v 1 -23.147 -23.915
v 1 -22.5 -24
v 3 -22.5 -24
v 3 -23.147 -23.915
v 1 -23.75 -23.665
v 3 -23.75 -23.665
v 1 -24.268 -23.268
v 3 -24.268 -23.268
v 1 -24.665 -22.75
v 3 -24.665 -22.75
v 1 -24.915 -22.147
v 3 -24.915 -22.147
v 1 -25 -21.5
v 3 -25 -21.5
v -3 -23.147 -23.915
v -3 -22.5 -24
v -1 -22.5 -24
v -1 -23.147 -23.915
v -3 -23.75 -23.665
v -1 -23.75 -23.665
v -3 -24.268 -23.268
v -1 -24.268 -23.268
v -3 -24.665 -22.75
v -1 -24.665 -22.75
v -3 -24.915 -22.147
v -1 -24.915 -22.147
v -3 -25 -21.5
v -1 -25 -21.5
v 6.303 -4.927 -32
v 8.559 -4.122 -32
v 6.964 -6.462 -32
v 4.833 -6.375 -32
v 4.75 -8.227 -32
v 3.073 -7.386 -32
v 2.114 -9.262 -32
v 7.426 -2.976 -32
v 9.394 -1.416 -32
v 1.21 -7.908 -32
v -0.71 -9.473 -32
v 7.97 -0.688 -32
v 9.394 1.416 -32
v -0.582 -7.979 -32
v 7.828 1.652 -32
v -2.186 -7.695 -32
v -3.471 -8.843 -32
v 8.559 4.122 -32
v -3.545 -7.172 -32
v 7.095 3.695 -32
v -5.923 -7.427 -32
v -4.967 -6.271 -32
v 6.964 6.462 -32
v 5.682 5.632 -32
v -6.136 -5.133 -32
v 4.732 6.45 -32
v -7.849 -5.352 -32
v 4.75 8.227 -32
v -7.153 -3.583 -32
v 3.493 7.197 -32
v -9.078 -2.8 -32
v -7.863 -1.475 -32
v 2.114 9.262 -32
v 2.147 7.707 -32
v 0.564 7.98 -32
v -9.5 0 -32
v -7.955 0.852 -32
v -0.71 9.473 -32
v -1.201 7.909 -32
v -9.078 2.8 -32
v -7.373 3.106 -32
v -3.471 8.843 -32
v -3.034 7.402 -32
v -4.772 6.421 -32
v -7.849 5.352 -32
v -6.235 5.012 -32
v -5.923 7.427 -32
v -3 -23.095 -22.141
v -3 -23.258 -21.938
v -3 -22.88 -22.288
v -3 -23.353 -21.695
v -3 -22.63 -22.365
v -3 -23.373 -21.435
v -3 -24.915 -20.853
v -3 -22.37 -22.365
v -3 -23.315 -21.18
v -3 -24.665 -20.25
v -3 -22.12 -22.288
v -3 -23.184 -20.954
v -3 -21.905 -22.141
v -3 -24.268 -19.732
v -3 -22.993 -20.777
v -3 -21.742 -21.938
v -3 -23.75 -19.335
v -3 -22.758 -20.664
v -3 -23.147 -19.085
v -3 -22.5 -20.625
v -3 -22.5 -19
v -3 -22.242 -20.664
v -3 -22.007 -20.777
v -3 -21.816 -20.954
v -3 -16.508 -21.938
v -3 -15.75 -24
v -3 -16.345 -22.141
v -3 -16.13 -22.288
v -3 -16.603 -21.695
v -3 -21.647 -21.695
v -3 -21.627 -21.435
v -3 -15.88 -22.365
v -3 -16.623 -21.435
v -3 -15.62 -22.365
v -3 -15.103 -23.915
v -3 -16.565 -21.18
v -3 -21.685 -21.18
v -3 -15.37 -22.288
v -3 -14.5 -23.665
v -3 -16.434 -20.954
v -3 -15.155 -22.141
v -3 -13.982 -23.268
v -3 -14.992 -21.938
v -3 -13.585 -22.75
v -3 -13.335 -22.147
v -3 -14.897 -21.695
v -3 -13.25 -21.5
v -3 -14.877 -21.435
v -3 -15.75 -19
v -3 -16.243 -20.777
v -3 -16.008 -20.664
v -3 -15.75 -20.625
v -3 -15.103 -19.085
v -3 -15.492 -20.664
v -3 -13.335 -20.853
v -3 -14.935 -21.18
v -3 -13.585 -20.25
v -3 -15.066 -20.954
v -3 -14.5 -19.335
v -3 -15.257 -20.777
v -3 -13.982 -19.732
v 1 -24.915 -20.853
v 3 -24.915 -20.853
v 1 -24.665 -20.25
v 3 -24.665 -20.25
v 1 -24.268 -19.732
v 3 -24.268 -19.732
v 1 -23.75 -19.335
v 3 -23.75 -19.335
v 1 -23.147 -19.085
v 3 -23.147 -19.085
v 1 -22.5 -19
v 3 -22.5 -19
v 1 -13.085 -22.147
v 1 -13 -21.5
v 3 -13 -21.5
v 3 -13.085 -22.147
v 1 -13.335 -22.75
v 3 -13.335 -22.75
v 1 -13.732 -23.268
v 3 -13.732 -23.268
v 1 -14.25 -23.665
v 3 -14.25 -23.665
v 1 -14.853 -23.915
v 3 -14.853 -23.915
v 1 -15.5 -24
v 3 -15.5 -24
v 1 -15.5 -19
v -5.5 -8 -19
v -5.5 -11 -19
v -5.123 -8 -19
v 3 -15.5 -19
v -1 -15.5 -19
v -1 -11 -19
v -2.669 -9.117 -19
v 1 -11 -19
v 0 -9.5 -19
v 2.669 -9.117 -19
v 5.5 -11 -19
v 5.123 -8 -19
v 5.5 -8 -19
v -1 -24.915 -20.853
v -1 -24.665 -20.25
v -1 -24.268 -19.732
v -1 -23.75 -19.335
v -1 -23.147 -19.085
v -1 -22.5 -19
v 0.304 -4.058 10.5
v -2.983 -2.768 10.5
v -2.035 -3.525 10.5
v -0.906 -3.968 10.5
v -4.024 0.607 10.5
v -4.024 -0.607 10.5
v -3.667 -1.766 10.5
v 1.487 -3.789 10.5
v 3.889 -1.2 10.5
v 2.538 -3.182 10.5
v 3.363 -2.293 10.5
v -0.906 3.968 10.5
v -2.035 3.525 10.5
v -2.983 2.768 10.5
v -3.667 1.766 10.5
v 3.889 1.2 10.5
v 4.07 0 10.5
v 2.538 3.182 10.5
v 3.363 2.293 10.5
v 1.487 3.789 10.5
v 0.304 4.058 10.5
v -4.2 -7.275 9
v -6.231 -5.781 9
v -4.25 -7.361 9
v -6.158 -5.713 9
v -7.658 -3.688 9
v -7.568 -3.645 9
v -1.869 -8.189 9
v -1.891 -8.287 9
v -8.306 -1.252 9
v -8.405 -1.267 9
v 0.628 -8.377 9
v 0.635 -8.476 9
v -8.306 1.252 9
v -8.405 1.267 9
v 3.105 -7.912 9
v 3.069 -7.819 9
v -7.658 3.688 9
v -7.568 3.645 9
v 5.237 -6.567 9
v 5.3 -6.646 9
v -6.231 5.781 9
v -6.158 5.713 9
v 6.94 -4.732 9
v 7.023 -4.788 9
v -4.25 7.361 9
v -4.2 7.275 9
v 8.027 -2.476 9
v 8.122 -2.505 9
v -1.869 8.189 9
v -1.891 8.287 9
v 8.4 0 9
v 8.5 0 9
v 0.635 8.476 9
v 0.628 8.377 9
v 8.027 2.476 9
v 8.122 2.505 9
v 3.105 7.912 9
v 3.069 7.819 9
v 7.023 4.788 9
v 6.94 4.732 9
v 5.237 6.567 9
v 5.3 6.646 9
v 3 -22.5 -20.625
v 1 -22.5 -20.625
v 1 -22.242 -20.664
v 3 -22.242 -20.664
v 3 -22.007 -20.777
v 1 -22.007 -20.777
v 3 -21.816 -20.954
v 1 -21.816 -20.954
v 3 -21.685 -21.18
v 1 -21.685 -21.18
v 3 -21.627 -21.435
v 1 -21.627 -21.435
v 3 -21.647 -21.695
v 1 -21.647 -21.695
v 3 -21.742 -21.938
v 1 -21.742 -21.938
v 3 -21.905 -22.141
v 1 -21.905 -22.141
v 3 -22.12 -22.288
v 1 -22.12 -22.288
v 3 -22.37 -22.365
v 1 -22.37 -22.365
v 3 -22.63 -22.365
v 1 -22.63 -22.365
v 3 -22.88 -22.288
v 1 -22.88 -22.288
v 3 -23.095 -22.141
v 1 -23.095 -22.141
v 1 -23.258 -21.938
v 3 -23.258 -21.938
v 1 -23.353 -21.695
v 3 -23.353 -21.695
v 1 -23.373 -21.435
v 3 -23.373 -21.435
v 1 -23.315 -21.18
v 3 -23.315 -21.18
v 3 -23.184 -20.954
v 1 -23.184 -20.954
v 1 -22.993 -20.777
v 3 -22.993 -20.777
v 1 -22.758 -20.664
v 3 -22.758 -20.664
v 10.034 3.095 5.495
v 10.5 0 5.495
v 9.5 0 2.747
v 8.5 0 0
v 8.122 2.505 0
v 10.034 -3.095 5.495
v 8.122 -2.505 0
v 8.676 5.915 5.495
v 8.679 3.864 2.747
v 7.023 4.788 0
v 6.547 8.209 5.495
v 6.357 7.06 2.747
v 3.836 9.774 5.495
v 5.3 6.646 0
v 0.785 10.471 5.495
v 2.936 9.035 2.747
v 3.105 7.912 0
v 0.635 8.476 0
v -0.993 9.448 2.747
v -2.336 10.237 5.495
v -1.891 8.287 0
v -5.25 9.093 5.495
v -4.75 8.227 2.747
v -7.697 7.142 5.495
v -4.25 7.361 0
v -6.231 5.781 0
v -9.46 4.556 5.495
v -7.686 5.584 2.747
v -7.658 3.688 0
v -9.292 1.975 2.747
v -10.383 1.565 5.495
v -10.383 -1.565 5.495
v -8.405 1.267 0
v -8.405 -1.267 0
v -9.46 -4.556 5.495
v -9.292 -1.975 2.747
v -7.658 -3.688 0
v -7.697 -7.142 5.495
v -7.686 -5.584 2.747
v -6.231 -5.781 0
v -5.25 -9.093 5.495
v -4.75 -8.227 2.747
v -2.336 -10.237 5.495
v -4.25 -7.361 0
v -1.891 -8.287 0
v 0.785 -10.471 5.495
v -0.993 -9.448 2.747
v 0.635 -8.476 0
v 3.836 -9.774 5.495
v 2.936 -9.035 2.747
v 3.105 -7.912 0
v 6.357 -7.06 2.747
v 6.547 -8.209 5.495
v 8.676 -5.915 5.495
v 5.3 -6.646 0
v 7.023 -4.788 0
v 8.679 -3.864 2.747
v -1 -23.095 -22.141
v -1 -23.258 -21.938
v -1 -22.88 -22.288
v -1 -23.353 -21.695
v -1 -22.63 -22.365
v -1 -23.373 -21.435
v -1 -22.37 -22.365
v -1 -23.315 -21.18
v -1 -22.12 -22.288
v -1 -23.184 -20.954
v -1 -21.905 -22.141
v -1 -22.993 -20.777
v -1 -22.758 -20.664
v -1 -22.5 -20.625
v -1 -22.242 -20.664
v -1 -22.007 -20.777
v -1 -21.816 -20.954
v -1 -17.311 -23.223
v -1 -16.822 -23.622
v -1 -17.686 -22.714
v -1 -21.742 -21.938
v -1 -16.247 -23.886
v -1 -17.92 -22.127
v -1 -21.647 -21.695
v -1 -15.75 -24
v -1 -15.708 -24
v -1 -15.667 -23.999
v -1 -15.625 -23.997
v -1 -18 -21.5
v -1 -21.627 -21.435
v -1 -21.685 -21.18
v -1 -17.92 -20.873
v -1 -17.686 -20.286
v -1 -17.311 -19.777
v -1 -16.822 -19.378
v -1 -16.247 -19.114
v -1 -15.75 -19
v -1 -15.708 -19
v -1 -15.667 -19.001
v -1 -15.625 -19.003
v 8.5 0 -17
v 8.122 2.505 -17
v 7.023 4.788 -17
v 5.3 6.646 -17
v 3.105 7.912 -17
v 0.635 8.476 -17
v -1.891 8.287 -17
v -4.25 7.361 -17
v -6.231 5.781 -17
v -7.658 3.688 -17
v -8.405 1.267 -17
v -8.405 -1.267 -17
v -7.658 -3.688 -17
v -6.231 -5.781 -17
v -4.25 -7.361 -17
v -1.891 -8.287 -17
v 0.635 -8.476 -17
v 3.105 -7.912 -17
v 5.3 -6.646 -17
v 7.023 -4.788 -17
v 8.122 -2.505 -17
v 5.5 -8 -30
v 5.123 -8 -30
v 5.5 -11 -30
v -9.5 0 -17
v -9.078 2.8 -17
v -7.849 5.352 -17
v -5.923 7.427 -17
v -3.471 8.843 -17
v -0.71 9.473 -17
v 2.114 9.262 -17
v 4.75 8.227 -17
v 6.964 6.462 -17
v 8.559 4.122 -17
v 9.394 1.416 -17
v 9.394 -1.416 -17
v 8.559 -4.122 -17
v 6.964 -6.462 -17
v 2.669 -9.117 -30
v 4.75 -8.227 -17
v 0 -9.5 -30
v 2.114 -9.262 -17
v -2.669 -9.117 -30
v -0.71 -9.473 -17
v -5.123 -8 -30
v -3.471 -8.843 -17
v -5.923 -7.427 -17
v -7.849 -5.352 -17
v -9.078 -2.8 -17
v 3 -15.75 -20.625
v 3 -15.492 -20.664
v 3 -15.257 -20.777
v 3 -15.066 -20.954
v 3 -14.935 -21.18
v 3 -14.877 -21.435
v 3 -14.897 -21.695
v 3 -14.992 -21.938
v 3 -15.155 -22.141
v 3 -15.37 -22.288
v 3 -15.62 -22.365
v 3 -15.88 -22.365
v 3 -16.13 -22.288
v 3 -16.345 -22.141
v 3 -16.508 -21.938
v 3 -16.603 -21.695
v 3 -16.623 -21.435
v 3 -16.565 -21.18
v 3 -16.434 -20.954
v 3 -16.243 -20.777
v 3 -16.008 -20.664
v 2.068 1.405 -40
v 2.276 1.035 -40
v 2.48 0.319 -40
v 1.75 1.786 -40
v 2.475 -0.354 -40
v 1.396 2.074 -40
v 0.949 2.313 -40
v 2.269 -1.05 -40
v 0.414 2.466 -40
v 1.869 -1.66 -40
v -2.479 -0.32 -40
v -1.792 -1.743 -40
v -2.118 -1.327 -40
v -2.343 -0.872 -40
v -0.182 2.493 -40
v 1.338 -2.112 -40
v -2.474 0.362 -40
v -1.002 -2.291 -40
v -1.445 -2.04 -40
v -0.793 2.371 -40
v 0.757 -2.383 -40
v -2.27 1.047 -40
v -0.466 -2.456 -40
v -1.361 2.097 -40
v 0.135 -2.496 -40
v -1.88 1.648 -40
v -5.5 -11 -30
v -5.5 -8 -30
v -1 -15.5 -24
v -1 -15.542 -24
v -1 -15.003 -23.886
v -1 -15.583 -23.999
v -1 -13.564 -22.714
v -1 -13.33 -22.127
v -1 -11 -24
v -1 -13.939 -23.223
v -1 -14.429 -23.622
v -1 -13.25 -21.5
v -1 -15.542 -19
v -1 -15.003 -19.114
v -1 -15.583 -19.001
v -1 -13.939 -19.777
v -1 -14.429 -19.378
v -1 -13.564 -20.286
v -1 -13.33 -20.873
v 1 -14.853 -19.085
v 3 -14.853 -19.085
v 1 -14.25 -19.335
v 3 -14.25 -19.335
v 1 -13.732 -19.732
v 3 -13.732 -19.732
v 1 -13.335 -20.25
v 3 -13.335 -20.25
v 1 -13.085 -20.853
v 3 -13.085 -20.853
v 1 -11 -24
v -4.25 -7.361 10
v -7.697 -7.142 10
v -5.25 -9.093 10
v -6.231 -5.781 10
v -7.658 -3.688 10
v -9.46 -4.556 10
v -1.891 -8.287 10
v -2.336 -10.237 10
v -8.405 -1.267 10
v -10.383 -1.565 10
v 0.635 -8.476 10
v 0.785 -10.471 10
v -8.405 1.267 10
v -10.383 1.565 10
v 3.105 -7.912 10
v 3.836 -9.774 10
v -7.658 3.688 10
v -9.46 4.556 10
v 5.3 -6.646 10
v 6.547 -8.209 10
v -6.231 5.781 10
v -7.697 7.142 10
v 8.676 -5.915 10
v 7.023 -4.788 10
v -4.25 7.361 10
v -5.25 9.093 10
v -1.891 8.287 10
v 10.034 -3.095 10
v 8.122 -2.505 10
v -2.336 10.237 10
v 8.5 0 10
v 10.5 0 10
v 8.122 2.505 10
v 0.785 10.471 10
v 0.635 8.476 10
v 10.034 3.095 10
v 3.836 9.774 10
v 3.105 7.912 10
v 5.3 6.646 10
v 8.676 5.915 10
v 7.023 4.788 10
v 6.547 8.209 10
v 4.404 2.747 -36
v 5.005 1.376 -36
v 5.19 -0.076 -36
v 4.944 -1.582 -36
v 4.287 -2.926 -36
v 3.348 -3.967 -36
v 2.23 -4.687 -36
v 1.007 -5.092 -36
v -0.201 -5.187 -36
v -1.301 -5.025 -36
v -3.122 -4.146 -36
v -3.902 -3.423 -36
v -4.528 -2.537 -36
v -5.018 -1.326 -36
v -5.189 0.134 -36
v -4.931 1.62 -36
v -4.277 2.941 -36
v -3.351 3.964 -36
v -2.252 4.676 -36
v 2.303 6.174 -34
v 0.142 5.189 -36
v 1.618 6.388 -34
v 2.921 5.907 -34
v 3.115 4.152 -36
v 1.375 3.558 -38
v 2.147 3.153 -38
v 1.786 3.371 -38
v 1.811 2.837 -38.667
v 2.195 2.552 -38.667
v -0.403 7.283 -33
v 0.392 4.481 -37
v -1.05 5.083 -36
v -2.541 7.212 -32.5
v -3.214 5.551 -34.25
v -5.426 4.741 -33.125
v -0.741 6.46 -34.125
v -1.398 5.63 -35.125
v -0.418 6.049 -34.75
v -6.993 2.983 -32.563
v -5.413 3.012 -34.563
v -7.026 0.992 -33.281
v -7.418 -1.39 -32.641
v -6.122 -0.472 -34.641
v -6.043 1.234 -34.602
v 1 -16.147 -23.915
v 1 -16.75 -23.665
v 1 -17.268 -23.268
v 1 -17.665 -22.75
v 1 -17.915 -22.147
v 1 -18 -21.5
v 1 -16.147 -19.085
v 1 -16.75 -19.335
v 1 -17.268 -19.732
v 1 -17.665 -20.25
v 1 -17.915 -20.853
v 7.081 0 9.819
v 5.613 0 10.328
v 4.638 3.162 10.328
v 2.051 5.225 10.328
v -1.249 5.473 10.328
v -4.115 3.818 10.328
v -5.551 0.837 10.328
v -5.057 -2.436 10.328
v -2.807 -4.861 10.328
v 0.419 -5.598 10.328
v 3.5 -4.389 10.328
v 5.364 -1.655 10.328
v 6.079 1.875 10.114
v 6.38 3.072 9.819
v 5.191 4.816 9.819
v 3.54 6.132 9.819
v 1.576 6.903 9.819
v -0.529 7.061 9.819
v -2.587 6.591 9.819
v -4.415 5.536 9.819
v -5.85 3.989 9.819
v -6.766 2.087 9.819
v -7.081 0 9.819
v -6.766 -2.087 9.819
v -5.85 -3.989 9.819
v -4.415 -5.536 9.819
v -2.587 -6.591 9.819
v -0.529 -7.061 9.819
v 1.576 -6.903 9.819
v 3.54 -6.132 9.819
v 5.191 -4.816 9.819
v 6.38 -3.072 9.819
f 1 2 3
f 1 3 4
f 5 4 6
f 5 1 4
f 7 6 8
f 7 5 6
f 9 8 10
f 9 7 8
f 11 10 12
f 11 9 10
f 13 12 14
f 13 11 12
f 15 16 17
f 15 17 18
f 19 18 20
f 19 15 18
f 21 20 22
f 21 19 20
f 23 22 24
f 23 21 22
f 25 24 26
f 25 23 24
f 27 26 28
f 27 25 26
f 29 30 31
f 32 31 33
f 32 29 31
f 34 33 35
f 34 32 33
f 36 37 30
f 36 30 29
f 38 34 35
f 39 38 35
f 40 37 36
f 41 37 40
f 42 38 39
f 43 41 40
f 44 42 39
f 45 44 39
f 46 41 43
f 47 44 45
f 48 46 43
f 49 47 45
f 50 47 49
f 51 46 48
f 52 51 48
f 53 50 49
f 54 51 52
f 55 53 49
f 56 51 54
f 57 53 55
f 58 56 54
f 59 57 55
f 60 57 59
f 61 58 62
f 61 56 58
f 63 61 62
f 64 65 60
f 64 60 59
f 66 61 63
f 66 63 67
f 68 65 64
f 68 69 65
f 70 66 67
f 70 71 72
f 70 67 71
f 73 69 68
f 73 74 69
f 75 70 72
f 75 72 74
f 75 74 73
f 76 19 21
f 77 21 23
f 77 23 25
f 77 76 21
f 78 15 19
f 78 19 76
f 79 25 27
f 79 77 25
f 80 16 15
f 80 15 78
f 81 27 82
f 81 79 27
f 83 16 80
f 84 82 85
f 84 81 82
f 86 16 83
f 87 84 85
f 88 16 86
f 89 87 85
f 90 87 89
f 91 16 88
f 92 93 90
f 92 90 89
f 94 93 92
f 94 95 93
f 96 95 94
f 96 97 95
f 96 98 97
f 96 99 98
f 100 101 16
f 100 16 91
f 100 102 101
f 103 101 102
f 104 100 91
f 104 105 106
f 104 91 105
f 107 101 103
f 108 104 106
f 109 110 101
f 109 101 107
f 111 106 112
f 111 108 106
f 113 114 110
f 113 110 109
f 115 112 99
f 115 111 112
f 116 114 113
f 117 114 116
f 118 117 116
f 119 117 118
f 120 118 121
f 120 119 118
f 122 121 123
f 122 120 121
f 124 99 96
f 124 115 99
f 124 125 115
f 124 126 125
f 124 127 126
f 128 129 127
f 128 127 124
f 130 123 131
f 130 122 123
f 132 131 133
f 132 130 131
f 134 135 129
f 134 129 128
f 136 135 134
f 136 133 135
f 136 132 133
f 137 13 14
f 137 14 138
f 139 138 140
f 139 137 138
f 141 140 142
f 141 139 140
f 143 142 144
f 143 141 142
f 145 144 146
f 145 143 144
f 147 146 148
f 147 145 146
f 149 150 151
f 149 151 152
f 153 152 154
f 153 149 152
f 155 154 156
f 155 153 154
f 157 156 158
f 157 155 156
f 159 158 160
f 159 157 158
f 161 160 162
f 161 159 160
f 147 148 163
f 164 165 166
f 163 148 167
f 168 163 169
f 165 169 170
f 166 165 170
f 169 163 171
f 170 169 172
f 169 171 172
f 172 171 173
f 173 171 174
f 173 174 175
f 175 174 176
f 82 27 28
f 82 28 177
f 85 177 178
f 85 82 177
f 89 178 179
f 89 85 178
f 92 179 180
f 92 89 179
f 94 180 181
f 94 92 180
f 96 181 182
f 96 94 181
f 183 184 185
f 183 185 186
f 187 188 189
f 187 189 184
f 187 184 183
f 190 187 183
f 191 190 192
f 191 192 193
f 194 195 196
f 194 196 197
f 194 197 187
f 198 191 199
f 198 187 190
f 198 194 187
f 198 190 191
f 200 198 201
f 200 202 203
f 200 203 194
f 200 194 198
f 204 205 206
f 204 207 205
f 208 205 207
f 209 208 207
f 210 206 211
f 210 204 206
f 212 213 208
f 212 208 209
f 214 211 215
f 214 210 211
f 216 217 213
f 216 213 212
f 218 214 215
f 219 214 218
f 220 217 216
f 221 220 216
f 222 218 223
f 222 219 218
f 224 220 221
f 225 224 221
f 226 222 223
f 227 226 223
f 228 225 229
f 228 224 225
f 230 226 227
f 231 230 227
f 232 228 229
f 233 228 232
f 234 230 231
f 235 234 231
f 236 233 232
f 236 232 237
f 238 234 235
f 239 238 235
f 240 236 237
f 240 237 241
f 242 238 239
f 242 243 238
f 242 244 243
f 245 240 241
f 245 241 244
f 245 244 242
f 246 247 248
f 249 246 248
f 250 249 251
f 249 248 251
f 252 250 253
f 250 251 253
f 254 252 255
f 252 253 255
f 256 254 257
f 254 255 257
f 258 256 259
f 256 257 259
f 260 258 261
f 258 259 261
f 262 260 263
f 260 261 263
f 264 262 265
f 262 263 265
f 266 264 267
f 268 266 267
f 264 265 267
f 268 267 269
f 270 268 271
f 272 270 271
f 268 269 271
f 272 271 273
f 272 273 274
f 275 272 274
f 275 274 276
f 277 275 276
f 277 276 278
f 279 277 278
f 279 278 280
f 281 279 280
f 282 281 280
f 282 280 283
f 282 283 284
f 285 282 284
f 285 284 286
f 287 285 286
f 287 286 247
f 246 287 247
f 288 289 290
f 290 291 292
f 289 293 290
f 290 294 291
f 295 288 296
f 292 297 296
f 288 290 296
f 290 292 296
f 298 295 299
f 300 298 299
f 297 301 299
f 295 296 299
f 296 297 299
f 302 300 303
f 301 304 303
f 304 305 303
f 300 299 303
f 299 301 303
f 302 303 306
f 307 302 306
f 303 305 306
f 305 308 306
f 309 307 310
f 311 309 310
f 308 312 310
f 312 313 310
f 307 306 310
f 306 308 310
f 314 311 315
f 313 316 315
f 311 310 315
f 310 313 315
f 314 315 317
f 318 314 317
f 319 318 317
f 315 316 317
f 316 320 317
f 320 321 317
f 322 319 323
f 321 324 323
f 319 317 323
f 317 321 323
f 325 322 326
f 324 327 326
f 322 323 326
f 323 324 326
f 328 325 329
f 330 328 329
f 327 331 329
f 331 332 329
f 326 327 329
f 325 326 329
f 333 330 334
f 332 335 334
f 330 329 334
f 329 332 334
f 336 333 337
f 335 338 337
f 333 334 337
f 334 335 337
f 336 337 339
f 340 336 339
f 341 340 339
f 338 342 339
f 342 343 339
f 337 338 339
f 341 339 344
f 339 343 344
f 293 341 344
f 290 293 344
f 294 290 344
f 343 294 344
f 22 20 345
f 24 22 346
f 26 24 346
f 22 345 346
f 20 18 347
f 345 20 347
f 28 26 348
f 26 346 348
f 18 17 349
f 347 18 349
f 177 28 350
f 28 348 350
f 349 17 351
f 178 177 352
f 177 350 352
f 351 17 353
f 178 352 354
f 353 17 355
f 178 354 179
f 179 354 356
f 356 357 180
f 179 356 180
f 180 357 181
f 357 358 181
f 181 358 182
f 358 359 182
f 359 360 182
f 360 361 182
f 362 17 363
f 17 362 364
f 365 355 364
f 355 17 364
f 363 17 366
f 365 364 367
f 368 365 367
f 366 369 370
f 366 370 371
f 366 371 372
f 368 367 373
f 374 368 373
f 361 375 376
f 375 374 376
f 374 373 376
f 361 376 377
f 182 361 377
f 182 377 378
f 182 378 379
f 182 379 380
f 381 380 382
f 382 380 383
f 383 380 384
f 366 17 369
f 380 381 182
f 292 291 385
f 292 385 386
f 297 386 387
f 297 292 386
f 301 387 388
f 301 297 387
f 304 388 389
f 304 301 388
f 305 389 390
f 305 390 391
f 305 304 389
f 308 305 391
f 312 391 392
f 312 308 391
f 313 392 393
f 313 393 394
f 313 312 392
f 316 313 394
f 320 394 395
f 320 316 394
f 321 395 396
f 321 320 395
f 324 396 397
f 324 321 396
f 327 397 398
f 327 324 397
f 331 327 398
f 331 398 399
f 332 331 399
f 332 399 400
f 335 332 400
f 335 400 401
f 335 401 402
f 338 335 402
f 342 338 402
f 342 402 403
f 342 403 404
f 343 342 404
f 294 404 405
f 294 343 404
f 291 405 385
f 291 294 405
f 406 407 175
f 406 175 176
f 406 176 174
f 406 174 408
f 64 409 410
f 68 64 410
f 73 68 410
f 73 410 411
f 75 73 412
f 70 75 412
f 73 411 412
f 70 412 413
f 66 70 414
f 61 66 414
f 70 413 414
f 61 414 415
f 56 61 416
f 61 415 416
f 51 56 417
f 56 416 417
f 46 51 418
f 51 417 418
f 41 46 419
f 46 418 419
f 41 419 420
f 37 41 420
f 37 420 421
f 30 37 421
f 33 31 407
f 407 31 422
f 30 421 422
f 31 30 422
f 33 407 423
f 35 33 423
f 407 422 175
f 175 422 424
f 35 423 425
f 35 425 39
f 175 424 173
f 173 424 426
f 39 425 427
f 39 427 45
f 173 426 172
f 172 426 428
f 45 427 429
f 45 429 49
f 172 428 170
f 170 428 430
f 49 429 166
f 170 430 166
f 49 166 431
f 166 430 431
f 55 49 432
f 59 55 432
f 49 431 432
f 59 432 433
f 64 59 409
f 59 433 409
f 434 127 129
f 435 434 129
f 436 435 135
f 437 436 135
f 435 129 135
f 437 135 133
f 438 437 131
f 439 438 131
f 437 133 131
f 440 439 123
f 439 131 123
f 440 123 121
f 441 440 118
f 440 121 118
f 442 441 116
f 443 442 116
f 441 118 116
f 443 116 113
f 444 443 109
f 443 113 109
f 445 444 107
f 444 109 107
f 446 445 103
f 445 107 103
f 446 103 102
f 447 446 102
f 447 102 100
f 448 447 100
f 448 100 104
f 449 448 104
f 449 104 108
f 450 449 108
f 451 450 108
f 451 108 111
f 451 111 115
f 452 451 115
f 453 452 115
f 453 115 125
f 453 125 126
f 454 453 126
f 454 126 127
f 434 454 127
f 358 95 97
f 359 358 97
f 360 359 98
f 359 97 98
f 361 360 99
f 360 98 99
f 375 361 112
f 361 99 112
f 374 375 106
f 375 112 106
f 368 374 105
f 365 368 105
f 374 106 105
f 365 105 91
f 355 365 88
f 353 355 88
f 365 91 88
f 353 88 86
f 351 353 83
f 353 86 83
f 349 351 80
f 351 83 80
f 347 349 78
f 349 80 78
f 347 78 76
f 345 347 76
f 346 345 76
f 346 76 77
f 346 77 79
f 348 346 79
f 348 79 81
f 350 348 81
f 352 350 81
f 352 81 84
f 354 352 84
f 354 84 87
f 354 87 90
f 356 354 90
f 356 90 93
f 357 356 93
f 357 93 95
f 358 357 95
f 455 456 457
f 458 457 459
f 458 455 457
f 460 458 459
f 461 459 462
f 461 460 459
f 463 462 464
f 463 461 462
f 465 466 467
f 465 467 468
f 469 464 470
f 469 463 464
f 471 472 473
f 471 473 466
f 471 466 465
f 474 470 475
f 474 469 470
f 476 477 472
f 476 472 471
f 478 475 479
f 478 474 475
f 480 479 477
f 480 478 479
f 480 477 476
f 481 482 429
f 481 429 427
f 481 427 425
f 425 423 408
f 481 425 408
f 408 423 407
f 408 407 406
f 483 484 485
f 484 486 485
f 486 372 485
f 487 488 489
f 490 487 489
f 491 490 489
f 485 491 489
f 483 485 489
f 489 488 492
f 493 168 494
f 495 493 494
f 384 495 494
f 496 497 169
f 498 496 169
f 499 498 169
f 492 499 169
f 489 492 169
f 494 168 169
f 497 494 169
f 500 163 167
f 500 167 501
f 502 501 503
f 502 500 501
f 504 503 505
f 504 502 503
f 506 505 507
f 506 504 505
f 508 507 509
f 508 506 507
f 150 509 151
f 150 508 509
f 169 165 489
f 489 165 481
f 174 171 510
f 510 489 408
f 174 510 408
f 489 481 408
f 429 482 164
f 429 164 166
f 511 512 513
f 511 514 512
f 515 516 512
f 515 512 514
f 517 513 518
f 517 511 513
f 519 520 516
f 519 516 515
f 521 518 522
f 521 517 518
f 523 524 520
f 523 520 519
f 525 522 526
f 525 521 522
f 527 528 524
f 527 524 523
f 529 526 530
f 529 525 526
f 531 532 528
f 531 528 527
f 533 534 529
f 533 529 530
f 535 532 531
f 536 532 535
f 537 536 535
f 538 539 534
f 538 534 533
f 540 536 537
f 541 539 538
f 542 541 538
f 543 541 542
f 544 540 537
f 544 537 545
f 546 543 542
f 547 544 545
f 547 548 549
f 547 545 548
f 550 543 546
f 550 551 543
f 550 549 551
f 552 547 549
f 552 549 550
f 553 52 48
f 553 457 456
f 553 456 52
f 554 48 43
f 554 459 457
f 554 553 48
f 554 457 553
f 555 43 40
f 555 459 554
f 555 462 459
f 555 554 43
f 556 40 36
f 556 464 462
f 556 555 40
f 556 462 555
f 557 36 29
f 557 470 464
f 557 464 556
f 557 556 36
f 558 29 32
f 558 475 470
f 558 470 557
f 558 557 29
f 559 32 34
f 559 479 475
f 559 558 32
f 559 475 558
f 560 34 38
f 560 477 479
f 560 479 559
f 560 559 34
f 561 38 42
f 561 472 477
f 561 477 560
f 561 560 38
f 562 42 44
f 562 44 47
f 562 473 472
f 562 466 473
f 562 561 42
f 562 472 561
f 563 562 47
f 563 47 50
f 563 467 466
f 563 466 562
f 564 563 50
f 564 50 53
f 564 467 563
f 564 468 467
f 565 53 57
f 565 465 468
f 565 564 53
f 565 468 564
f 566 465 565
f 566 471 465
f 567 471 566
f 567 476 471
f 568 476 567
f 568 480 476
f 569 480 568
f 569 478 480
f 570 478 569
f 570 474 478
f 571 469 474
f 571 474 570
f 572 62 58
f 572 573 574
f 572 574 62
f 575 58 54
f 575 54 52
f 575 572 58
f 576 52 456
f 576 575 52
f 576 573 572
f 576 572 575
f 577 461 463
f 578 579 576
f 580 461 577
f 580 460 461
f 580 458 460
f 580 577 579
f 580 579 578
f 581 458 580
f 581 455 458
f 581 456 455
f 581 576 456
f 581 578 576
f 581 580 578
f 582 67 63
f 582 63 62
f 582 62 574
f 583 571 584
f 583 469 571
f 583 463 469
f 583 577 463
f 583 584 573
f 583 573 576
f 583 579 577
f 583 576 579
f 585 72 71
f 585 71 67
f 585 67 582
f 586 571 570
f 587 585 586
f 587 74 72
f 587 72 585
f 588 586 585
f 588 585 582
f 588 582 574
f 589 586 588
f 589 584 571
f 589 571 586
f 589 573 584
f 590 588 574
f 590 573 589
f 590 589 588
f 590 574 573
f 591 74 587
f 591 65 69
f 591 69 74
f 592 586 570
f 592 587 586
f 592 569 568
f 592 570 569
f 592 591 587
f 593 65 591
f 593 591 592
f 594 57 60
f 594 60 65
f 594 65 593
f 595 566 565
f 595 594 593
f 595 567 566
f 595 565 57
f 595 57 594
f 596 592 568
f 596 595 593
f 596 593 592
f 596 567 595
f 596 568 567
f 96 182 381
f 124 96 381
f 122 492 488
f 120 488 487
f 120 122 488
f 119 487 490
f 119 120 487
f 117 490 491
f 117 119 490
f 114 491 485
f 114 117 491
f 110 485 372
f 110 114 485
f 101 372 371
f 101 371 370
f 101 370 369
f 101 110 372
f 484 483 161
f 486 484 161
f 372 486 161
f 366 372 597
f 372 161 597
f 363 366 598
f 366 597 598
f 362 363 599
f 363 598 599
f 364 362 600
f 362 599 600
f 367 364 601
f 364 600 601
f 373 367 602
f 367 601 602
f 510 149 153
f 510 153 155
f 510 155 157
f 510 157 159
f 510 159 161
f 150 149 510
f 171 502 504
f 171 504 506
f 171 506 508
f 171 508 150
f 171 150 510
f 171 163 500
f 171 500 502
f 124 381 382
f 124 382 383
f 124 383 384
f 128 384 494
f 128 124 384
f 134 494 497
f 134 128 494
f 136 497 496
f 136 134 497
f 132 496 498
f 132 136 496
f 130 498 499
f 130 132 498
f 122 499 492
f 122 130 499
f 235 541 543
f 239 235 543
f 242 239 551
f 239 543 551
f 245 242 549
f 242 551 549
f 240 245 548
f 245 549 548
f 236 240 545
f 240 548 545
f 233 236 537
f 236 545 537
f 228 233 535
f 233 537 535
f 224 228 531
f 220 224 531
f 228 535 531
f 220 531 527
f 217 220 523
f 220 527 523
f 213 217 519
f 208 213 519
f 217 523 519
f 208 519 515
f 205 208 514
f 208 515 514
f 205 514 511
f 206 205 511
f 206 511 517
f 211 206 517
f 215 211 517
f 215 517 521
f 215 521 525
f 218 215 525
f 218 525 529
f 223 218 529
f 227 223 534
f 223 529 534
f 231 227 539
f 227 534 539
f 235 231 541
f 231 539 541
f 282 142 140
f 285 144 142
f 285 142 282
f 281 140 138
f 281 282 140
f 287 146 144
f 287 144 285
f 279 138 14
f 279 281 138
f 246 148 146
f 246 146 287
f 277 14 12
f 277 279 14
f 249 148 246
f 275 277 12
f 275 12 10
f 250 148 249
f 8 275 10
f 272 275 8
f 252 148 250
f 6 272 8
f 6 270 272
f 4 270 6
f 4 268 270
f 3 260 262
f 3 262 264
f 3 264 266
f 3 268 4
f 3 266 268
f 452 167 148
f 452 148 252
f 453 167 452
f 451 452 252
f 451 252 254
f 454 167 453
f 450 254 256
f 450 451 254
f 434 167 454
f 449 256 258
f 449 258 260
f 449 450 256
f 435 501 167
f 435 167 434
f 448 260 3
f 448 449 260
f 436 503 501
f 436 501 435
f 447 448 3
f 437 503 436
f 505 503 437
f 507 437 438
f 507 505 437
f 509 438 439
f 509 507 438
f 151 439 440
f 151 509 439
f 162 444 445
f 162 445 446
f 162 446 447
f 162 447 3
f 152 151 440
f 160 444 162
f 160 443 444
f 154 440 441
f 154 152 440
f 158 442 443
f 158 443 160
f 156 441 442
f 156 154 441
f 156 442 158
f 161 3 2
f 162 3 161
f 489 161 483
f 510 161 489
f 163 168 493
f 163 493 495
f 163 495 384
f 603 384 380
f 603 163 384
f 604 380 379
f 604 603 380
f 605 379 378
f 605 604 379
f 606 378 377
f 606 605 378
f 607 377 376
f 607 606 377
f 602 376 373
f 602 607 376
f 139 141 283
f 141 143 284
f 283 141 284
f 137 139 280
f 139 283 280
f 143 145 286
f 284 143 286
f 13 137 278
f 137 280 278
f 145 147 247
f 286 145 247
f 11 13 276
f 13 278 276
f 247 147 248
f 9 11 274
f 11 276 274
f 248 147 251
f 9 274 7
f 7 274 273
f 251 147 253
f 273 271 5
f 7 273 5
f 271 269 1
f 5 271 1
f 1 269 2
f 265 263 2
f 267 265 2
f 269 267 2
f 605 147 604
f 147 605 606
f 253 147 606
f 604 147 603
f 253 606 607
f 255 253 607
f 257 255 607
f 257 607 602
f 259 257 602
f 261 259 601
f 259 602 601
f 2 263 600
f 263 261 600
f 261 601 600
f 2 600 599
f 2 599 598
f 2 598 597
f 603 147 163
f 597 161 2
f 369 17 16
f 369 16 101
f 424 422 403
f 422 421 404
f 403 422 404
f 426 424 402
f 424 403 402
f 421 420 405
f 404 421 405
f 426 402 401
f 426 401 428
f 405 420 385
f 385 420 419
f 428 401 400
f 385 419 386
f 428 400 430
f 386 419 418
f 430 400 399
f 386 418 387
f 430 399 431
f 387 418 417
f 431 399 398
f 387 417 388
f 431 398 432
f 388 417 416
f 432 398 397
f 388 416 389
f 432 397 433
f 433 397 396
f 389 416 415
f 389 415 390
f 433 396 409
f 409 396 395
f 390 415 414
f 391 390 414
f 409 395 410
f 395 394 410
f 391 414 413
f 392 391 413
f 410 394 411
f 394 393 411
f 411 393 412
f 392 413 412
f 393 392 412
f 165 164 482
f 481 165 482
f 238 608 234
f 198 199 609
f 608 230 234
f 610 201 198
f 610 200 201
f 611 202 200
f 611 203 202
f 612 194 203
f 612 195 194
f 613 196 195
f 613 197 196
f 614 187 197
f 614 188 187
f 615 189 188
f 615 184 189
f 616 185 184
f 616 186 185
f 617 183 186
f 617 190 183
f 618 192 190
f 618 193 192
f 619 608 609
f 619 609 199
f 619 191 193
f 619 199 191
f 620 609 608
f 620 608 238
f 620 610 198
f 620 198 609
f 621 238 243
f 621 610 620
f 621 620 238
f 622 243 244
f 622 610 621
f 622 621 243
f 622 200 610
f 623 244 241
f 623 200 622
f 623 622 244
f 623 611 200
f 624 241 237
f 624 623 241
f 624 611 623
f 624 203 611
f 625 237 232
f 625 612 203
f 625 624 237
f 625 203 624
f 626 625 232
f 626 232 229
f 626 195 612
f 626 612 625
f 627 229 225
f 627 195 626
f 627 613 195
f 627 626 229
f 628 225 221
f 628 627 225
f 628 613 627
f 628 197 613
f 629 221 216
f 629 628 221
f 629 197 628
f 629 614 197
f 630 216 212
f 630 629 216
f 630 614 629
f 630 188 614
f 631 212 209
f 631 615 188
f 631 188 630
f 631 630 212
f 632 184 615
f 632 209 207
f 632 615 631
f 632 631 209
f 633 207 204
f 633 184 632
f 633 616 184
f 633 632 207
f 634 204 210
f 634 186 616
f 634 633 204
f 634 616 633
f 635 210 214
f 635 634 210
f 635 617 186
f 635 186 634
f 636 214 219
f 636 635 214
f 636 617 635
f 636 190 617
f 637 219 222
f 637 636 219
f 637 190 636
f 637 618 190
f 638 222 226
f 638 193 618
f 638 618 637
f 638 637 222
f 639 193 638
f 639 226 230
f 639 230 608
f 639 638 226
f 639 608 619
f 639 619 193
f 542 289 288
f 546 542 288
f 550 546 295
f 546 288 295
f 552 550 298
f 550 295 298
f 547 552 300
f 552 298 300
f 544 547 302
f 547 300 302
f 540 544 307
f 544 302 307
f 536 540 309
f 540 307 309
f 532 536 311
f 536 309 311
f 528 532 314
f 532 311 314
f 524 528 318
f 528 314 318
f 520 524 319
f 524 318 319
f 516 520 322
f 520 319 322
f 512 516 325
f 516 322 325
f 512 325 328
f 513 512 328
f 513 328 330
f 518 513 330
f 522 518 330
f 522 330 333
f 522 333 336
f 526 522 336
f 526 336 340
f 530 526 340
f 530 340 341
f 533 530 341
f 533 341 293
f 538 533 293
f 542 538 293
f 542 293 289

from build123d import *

# Parameters (mm, degrees)
SKETCH1_R            = 8.5
BOSS_EXTRUDE1_DEPTH  = 17
SKETCH2_R            = 10.5
BOSS_EXTRUDE2_DEPTH  = 10
CHAMFER1_SIZE        = 5.494954839
CHAMFER1_SIZE_2      = 2
SKETCH3_R            = 8.5
CUT_EXTRUDE1_DEPTH   = 1
SKETCH4_R            = 9.5
BOSS_EXTRUDE3_DEPTH  = 15
SKETCH9_W            = 11
SKETCH9_H            = 11
BOSS_EXTRUDE4_DEPTH  = 3
SKETCH10_W           = 2
SKETCH10_H           = 5
BOSS_EXTRUDE5_DEPTH  = 7
FILLET1_R            = 2.5
SKETCH13_R           = 8.4
BOSS_EXTRUDE7_DEPTH  = 1.5
FILLET3_R            = 7
SKETCH14_W           = 5
SKETCH14_H           = 12
BOSS_EXTRUDE9_DEPTH  = 2
SKETCH15_W           = 5
SKETCH15_H           = 11.75
BOSS_EXTRUDE10_DEPTH = 2
FILLET4_START        = -5.5
FILLET4_DEPTH        = 4.5
FILLET4_START_2      = 1
FILLET4_2_DEPTH      = 4.5
CUT_EXTRUDE3_REACH   = 51.064
SKETCH16_R           = 0.875


with BuildPart() as part:
    # Sketch1 → Boss-Extrude1 (new body)
    with BuildSketch(Plane.XY):
        Circle(SKETCH1_R)
    extrude(amount=-BOSS_EXTRUDE1_DEPTH)

    # Sketch2 → Boss-Extrude2 (add)
    with BuildSketch(Plane.XY):
        Circle(SKETCH2_R)
    extrude(amount=BOSS_EXTRUDE2_DEPTH)

    # Chamfer1
    # the kernel refuses this chamfer: 5.494954839, 2 mm, written as the material it takes off along each edge
    with BuildSketch(Plane(origin=(0, 0, 0), x_dir=(1, 0, 0), z_dir=(0, -1, 0))) as chamfer1_piece_1_section:
        Polygon((10.5, CHAMFER1_SIZE), (10.5 - CHAMFER1_SIZE_2, 0), (10.5, 0), align=None)
    chamfer1_piece_1 = revolve(axis=Axis((0, 0, 0), (0, 0, 1)), mode=Mode.PRIVATE)
    chamfer1_piece_1 = chamfer1_piece_1 - Plane(origin=(0, 0, 0), x_dir=(1, 0, 0), z_dir=(0, 0, 1)) * Cylinder(8.5, 42, mode=Mode.PRIVATE)
    add(chamfer1_piece_1, mode=Mode.SUBTRACT)

    # Sketch3 → Cut-Extrude1 (cut)
    with BuildSketch(Plane.XY.offset(10)):
        Circle(SKETCH3_R)
    extrude(amount=-CUT_EXTRUDE1_DEPTH, mode=Mode.SUBTRACT)

    # Sketch4 → Boss-Extrude3 (add)
    with BuildSketch(Plane(origin=(0, 0, -17), x_dir=(-1, 0, 0), z_dir=(0, 0, -1))):
        Circle(SKETCH4_R)
    extrude(amount=BOSS_EXTRUDE3_DEPTH)

    # Loft2: read off the stored shape, not the designer's step
    # Loft2: loft between two sections, ruled curve by curve
    loft2_from = [
        Edge.make_bspline([(5.6816796, 5.631919471, -32), (16.945518542, -5.731439728, -32), (5.582159343, -16.99527867, -32), (-5.6816796, -5.631919471, -32), (-16.945518542, 5.731439728, -32), (-5.582159343, 16.99527867, -32), (5.6816796, 5.631919471, -32)], [0, 0, 0, 0, 0.5, 0.5, 0.5, 1, 1, 1, 1], 3, [1, 0.333333333, 0.333333333, 1, 0.333333333, 0.333333333, 1]),
    ]
    loft2_to = [
        Edge.make_bspline([(2.275915377, 1.034509157, -40), (4.344933691, -3.517321597, -40), (-0.206897063, -5.586339911, -40), (-2.275915377, -1.034509157, -40), (-4.344933691, 3.517321597, -40), (0.206897063, 5.586339911, -40), (2.275915377, 1.034509157, -40)], [0, 0, 0, 0, 0.5, 0.5, 0.5, 1, 1, 1, 1], 3, [1, 0.333333333, 0.333333333, 1, 0.333333333, 0.333333333, 1]),
    ]
    loft2 = Solid(Shell([*[Face.make_surface_from_curves(loft2_from[k], loft2_to[k]) for k in range(1)], Face(Wire(loft2_from)), Face(Wire(loft2_to))]))
    add(loft2)

    # Sketch9 → Boss-Extrude4 (add)
    with BuildSketch(Plane(origin=(0, -8, 0), x_dir=(1, 0, 0), z_dir=(0, 1, 0))):
        with Locations((0, 24.5)):
            Rectangle(SKETCH9_W, SKETCH9_H)
    extrude(amount=-BOSS_EXTRUDE4_DEPTH)

    # Sketch10 → Boss-Extrude5 (add)
    with BuildSketch(Plane.XZ.offset(11)):
        with Locations((0, -21.5)):
            Rectangle(SKETCH10_W, SKETCH10_H)
    extrude(amount=BOSS_EXTRUDE5_DEPTH)

    # Fillet1
    fillet1_edges = [part.edges().sort_by_distance(p)[0] for p in [
        (0, -18, -19),
        (0, -18, -24),
    ]]
    fillet(fillet1_edges, radius=FILLET1_R - 0.0001)  # a hair under: the kernel refuses the full size

    # Sketch13 → Boss-Extrude7 (add)
    with BuildSketch(Plane.XY.offset(9)):
        Circle(SKETCH13_R)
    extrude(amount=BOSS_EXTRUDE7_DEPTH)

    # Fillet3
    # the kernel refuses this fillet: 7 mm, written as the material it takes off along each edge
    with BuildSketch(Plane(origin=(0, 0, 10.5), x_dir=(1, 0, 0), z_dir=(0, -1, 0))) as fillet3_piece_1:
        with BuildLine():
            CenterArc((4.069872981, -7), FILLET3_R, 51.786789298, 38.213210702)
            Line((4.069872981, 0), (8.4, 0))
            Line((8.4, 0), (8.4, -1.5))
        make_face()
    revolve(axis=Axis((0, 0, 10.5), (0, 0, 1)), mode=Mode.SUBTRACT)

    # Sketch14 → Boss-Extrude9 (add)
    with BuildSketch(Plane(origin=(1, 0, 0), x_dir=(0, 0, -1), z_dir=(1, 0, 0))):
        with Locations((21.5, -19)):
            Rectangle(SKETCH14_W, SKETCH14_H)
    extrude(amount=BOSS_EXTRUDE9_DEPTH)

    # Sketch15 → Boss-Extrude10 (add)
    with BuildSketch(Plane.ZY.offset(1)):
        with Locations((-21.5, -19.125)):
            Rectangle(SKETCH15_W, SKETCH15_H)
    extrude(amount=BOSS_EXTRUDE10_DEPTH)

    # Fillet4: read off the stored shape, not the designer's step
    # Fillet4 outline → Fillet4 (cut)
    with BuildSketch(Plane.YZ.offset(FILLET4_START)):
        with BuildLine():
            Line((-25, -19), (-25, -21.5))
            ThreePointArc((-25, -21.5), (-24.267766953, -19.732233047), (-22.5, -19))
            Line((-22.5, -19), (-25, -19))
        make_face()
        with BuildLine():
            ThreePointArc((-22.5, -24), (-24.267766953, -23.267766953), (-25, -21.5))
            Line((-25, -21.5), (-25, -24))
            Line((-25, -24), (-22.5, -24))
        make_face()
        with BuildLine():
            ThreePointArc((-13.25, -21.5), (-13.982233047, -23.267766953), (-15.75, -24))
            Line((-15.75, -24), (-13.25, -24))
            Line((-13.25, -24), (-13.25, -21.5))
        make_face()
        with BuildLine():
            ThreePointArc((-15.75, -19), (-13.982233047, -19.732233047), (-13.25, -21.5))
            Line((-13.25, -21.5), (-13.25, -19))
            Line((-13.25, -19), (-15.75, -19))
        make_face()
    extrude(amount=FILLET4_DEPTH, mode=Mode.SUBTRACT)

    # Fillet4 2 outline → Fillet4 2 (cut)
    with BuildSketch(Plane.YZ.offset(FILLET4_START_2)):
        with BuildLine():
            Line((-25, -19), (-25, -21.5))
            ThreePointArc((-25, -21.5), (-24.267766953, -19.732233047), (-22.5, -19))
            Line((-22.5, -19), (-25, -19))
        make_face()
        with BuildLine():
            ThreePointArc((-22.5, -24), (-24.267766953, -23.267766953), (-25, -21.5))
            Line((-25, -21.5), (-25, -24))
            Line((-25, -24), (-22.5, -24))
        make_face()
        with BuildLine():
            Line((-15.5, -24), (-13, -24))
            Line((-13, -24), (-13, -21.5))
            ThreePointArc((-13, -21.5), (-13.732233047, -23.267766953), (-15.5, -24))
        make_face()
        with BuildLine():
            ThreePointArc((-15.5, -19), (-13.732233047, -19.732233047), (-13, -21.5))
            Line((-13, -21.5), (-13, -19))
            Line((-13, -19), (-15.5, -19))
        make_face()
    extrude(amount=FILLET4_2_DEPTH, mode=Mode.SUBTRACT)

    # Cut-Extrude3: up to this face of the body (flat: up to its plane)
    cut_extrude3_end = Plane(part.part.faces().sort_by_distance((3, -19, -21.5))[0])
    # Sketch16 → Cut-Extrude3 (cut, up to the picked face)
    with BuildSketch(Plane.ZY.offset(3), mode=Mode.PRIVATE) as cut_extrude3_sk1:
        with Locations((-21.5, -15.75)):
            Circle(SKETCH16_R)
    cut_extrude3_tool1 = split(extrude(cut_extrude3_sk1.sketch, amount=-CUT_EXTRUDE3_REACH, mode=Mode.PRIVATE), bisect_by=cut_extrude3_end, keep=Keep.BOTH, mode=Mode.PRIVATE)
    # Sketch16 → Cut-Extrude3 (cut, up to the picked face)
    with BuildSketch(Plane.ZY.offset(3), mode=Mode.PRIVATE) as cut_extrude3_sk2:
        with Locations((-21.5, -22.5)):
            Circle(SKETCH16_R)
    cut_extrude3_tool2 = split(extrude(cut_extrude3_sk2.sketch, amount=-CUT_EXTRUDE3_REACH, mode=Mode.PRIVATE), bisect_by=cut_extrude3_end, keep=Keep.BOTH, mode=Mode.PRIVATE)
    add(cut_extrude3_tool1.solids().sort_by(Axis((-3, -15.75, -21.5), (1, 0, 0)))[0], mode=Mode.SUBTRACT)
    add(cut_extrude3_tool2.solids().sort_by(Axis((-3, -22.5, -21.5), (1, 0, 0)))[0], mode=Mode.SUBTRACT)


solid = part.part
